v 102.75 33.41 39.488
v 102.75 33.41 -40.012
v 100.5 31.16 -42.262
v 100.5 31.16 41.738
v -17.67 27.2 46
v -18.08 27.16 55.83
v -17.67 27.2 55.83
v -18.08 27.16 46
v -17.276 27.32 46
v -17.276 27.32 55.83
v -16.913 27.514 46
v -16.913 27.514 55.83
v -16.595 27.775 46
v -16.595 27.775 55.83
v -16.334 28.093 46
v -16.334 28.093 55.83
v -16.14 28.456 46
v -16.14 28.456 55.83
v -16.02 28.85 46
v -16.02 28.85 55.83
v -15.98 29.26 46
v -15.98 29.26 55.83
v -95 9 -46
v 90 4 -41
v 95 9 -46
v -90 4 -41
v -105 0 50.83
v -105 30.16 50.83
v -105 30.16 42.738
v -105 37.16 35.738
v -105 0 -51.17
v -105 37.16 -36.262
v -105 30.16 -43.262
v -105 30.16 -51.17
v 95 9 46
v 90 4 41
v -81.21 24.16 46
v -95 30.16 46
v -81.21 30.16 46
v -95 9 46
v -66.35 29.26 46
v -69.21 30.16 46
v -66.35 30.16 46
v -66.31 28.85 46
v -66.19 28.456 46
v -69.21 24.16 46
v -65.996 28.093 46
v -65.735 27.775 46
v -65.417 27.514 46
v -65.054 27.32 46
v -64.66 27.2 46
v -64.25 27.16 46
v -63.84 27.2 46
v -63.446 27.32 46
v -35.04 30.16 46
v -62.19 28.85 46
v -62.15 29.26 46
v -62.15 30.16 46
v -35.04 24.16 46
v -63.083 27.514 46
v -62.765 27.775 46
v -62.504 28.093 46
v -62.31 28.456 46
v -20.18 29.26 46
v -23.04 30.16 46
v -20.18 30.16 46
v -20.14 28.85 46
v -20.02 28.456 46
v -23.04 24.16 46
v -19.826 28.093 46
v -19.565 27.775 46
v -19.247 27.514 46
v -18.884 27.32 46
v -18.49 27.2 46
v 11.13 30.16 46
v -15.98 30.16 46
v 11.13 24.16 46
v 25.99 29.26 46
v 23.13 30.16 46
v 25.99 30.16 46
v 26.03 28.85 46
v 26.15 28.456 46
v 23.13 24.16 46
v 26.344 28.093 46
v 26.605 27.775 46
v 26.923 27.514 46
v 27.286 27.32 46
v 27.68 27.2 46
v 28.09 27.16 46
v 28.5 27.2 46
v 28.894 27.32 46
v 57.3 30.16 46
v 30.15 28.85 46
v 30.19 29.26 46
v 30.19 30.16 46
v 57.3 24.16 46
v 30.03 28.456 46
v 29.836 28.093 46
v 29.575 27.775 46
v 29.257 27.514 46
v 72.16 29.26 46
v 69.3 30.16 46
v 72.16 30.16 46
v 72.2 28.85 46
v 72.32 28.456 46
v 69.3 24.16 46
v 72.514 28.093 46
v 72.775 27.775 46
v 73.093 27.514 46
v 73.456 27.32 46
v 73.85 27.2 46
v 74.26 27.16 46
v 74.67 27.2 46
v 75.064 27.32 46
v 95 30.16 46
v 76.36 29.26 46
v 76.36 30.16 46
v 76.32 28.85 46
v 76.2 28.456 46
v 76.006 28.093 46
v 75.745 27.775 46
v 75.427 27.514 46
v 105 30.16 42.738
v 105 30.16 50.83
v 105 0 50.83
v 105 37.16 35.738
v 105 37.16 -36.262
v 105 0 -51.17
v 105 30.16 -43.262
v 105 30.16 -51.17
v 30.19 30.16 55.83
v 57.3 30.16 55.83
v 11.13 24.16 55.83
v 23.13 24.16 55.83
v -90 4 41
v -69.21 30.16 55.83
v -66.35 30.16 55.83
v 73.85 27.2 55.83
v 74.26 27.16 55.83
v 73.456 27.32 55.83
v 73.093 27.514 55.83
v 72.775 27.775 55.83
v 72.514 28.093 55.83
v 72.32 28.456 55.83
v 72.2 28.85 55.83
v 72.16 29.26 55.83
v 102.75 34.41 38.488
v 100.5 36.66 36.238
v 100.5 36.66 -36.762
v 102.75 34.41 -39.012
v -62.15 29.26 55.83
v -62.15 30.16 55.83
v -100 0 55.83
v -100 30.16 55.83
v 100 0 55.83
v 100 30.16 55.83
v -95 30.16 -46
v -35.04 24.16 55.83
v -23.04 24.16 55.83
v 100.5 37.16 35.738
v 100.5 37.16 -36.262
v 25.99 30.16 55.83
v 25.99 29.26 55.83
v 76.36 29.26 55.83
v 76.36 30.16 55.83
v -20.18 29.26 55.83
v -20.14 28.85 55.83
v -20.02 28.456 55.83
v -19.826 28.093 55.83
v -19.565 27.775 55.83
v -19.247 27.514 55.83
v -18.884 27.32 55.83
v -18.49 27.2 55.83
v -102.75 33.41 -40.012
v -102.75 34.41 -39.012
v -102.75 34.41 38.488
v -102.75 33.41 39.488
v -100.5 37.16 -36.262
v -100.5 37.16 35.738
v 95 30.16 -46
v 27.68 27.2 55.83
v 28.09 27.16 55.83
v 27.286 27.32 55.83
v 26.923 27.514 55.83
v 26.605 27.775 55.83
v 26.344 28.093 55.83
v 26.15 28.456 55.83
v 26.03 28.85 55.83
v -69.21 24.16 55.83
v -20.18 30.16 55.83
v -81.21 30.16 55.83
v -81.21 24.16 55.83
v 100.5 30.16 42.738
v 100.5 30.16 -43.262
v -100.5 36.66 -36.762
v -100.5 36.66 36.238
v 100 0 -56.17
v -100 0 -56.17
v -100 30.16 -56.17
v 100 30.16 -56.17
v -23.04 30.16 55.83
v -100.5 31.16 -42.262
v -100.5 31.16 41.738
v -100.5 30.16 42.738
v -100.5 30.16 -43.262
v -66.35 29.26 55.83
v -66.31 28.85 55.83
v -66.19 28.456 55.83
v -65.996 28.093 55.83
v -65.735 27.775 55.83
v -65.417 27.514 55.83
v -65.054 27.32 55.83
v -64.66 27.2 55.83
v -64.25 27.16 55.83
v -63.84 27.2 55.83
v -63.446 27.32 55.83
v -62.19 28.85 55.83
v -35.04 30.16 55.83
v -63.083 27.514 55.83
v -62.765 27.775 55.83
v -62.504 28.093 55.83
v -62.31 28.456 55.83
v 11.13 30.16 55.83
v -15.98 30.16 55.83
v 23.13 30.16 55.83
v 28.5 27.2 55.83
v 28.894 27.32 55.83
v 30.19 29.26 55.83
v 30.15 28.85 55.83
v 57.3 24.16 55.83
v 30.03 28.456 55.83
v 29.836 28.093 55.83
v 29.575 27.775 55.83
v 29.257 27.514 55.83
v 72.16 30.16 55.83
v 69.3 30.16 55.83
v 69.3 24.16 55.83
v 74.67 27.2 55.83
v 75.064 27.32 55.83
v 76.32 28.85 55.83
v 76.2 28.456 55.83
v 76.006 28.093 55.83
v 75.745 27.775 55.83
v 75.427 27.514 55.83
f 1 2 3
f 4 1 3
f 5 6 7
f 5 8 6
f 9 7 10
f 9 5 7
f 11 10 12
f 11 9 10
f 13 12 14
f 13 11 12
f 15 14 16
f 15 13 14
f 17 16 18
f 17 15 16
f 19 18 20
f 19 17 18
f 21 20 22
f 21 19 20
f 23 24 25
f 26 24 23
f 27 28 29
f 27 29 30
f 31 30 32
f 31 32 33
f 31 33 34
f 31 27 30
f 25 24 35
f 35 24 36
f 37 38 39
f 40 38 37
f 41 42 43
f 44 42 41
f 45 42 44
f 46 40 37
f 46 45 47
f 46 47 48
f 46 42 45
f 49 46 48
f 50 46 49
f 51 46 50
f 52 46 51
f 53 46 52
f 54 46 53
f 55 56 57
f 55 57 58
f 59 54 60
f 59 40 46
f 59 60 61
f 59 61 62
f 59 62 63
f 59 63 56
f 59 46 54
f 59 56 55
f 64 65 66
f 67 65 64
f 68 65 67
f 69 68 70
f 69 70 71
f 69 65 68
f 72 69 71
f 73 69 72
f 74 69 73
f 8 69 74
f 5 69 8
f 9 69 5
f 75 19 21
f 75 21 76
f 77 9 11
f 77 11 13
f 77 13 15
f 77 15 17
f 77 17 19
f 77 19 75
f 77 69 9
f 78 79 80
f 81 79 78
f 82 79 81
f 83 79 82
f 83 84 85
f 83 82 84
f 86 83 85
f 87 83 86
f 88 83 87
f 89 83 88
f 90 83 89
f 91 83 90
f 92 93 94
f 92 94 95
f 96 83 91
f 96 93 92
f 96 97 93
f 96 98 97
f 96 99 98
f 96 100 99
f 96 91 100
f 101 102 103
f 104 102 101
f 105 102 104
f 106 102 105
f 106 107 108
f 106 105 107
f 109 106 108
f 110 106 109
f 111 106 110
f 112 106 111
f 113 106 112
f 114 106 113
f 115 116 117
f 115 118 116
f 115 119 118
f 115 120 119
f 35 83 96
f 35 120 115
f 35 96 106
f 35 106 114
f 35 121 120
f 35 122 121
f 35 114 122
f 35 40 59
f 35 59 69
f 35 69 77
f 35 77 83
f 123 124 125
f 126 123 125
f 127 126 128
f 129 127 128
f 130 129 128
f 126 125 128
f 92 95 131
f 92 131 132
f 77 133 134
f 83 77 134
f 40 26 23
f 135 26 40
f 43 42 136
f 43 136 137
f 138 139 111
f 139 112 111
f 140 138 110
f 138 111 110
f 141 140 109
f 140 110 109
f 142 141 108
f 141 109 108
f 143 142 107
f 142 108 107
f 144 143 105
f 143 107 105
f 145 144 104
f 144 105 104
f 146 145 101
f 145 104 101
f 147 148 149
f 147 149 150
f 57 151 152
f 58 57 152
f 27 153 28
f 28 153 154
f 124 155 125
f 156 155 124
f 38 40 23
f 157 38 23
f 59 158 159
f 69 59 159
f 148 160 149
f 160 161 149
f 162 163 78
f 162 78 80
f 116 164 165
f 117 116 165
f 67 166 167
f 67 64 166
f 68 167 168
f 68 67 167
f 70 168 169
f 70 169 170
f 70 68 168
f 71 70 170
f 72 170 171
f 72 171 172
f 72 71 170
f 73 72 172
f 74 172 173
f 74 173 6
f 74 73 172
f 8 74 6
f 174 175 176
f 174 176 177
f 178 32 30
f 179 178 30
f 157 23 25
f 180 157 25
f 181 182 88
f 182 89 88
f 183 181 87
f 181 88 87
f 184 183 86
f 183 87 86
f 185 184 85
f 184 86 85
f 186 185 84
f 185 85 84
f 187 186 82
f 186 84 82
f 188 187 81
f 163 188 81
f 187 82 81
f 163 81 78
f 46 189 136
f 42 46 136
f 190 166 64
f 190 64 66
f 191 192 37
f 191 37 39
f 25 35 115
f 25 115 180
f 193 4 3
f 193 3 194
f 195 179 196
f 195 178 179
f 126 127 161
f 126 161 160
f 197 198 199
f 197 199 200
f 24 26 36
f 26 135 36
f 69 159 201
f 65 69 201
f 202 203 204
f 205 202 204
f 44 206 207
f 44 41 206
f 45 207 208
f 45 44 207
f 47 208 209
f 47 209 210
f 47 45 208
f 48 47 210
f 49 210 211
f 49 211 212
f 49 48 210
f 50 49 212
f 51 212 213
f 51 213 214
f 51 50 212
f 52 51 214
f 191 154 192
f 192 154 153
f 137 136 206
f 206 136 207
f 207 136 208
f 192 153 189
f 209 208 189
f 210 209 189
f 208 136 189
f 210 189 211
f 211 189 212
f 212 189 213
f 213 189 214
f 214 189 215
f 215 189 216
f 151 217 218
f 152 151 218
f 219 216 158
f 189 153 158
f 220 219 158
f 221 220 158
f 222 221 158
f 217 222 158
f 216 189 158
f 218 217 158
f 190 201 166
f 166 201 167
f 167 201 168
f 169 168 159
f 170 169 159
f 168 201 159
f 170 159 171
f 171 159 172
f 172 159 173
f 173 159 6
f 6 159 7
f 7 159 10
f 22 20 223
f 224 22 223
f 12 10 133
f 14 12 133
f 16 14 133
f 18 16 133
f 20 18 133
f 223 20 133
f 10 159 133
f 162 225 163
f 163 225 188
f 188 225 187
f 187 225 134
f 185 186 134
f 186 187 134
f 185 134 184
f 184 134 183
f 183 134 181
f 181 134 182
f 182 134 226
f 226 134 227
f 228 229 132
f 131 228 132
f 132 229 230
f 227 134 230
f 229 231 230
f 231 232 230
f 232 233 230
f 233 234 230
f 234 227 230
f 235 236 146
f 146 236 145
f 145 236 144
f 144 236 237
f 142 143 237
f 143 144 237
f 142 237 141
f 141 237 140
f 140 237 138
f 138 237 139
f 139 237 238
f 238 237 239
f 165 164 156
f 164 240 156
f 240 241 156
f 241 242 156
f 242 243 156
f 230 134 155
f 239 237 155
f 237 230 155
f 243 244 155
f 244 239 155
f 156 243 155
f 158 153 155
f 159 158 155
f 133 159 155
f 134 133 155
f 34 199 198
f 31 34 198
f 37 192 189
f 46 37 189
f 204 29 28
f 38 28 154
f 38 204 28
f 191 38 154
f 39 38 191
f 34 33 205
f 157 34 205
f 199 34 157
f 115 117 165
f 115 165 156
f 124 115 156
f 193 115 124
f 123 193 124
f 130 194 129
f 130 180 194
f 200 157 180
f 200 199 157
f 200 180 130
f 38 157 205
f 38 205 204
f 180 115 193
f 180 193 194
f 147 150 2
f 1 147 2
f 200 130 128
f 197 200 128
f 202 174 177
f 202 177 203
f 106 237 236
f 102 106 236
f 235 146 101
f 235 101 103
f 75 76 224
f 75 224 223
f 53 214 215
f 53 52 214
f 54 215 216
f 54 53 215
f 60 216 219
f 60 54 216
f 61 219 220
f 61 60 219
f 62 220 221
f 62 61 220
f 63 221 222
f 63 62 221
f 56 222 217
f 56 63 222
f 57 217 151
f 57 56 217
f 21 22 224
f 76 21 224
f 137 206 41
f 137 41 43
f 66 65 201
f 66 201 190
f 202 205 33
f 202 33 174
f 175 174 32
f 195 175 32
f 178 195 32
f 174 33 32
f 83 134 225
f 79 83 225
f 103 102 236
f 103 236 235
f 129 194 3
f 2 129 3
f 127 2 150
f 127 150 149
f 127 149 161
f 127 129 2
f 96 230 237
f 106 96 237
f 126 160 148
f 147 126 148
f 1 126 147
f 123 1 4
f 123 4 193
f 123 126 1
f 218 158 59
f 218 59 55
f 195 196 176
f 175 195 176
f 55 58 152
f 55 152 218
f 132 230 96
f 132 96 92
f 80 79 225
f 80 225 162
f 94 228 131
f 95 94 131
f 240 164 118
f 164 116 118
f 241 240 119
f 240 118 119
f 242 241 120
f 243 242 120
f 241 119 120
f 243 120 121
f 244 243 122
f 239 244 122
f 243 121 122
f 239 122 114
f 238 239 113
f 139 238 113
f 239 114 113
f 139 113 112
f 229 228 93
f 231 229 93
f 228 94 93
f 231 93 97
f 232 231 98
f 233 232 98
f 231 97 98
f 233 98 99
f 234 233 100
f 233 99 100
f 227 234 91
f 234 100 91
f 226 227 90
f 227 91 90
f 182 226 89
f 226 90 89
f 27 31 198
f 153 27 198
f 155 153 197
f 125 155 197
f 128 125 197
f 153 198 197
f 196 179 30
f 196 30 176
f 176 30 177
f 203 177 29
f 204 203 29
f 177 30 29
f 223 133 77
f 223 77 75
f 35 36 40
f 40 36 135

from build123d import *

# Parameters (mm, degrees)
SKETCH1_W           = 210
SKETCH1_H           = 112
SKETCH1_W_2         = 190
SKETCH1_H_2         = 92
BOSS_EXTRUDE1_DEPTH = 30.16
SKETCH2_W           = 210
SKETCH2_H           = 112
BOSS_EXTRUDE2_DEPTH = 4
BOSS_EXTRUDE3_DEPTH = 4.5
SKETCH5_W           = 12
SKETCH5_H           = 6
CUT_EXTRUDE2_DEPTH  = 14.5
SKETCH6_W           = 4.2
SKETCH6_H           = 3
CUT_EXTRUDE3_DEPTH  = 14.5
CHAMFER1_SIZE       = 5
CHAMFER2_SIZE       = 5
CUT_EXTRUDE4_DEPTH  = 100
FILLET1_R           = 2.1


with BuildPart() as part:
    # Sketch1 → Boss-Extrude1 (new body)
    with BuildSketch(Plane(origin=(0, 0, 0), x_dir=(1, 0, 0), z_dir=(0, 1, 0))):
        with Locations((0, 0.169761006)):
            Rectangle(SKETCH1_W, SKETCH1_H)
        Rectangle(SKETCH1_W_2, SKETCH1_H_2, mode=Mode.SUBTRACT)
    extrude(amount=BOSS_EXTRUDE1_DEPTH)

    # Sketch2 → Boss-Extrude2 (add)
    with BuildSketch(Plane.XZ):
        with Locations((0, -0.169761006)):
            Rectangle(SKETCH2_W, SKETCH2_H)
    extrude(amount=-BOSS_EXTRUDE2_DEPTH)

    # Sketch3 → Boss-Extrude3 (add)
    with BuildSketch(Plane(origin=(105, 0, 0), x_dir=(0, 0, -1), z_dir=(1, 0, 0))):
        Polygon((-42.738491713, 30.16), (43.261508287, 30.16), (36.261508287, 37.16), (-35.738491713, 37.16), align=None)
    boss_extrude3 = extrude(amount=-BOSS_EXTRUDE3_DEPTH)

    # Sketch5 → Cut-Extrude2 (cut)
    with BuildSketch(Plane.XY.offset(55.830238994)):
        with Locations((63.3, 27.16)):
            Rectangle(SKETCH5_W, SKETCH5_H)
        with Locations((17.13, 27.16)):
            Rectangle(SKETCH5_W, SKETCH5_H)
        with Locations((-29.04, 27.16)):
            Rectangle(SKETCH5_W, SKETCH5_H)
        with Locations((-75.21, 27.16)):
            Rectangle(SKETCH5_W, SKETCH5_H)
    extrude(amount=-CUT_EXTRUDE2_DEPTH, mode=Mode.SUBTRACT)

    # Sketch6 → Cut-Extrude3 (cut)
    with BuildSketch(Plane.XY.offset(55.830238994)):
        with Locations((-64.25, 28.66)):
            Rectangle(SKETCH6_W, SKETCH6_H)
        with Locations((-18.08, 28.66)):
            Rectangle(SKETCH6_W, SKETCH6_H)
        with Locations((28.09, 28.66)):
            Rectangle(SKETCH6_W, SKETCH6_H)
        with Locations((74.26, 28.66)):
            Rectangle(SKETCH6_W, SKETCH6_H)
    extrude(amount=-CUT_EXTRUDE3_DEPTH, mode=Mode.SUBTRACT)

    # Chamfer1
    chamfer1_edges = [part.edges().sort_by_distance(p)[0] for p in [
        (0, 4, -46),
        (0, 4, 46),
        (-95, 4, 0),
        (95, 4, 0),
    ]]
    chamfer(chamfer1_edges, length=CHAMFER1_SIZE)

    # Chamfer2
    chamfer2_edges = [part.edges().sort_by_distance(p)[0] for p in [
        (105, 15.08, 55.830238994),
        (-105, 15.08, 55.830238994),
        (-105, 15.08, -56.169761006),
        (105, 15.08, -56.169761006),
    ]]
    chamfer(chamfer2_edges, length=CHAMFER2_SIZE)

    # Sketch7 → Cut-Extrude4 (cut)
    with BuildSketch(Plane.XY.offset(55.830238994)):
        Polygon((100.5, 36.66), (102.75, 34.41), (102.75, 33.41), (100.5, 31.16), align=None)
    cut_extrude4 = extrude(amount=-CUT_EXTRUDE4_DEPTH, mode=Mode.SUBTRACT)

    # Mirror1: Boss-Extrude3, Cut-Extrude4 across plane
    add(boss_extrude3.mirror(Plane(origin=(0, 0, 0), x_dir=(0, 0, 1), z_dir=(1, 0, 0))))
    add(cut_extrude4.mirror(Plane(origin=(0, 0, 0), x_dir=(0, 0, 1), z_dir=(1, 0, 0))), mode=Mode.SUBTRACT)

    # Fillet1
    fillet1_edges = [part.edges().sort_by_distance(p)[0] for p in [
        (76.36, 27.16, 50.915119497),
        (30.19, 27.16, 50.915119497),
        (-15.98, 27.16, 50.915119497),
        (-62.15, 27.16, 50.915119497),
        (72.16, 27.16, 50.915119497),
        (25.99, 27.16, 50.915119497),
        (-20.18, 27.16, 50.915119497),
        (-66.35, 27.16, 50.915119497),
    ]]
    fillet(fillet1_edges, radius=FILLET1_R - 0.0001)  # a hair under: the kernel refuses the full size


solid = part.part
